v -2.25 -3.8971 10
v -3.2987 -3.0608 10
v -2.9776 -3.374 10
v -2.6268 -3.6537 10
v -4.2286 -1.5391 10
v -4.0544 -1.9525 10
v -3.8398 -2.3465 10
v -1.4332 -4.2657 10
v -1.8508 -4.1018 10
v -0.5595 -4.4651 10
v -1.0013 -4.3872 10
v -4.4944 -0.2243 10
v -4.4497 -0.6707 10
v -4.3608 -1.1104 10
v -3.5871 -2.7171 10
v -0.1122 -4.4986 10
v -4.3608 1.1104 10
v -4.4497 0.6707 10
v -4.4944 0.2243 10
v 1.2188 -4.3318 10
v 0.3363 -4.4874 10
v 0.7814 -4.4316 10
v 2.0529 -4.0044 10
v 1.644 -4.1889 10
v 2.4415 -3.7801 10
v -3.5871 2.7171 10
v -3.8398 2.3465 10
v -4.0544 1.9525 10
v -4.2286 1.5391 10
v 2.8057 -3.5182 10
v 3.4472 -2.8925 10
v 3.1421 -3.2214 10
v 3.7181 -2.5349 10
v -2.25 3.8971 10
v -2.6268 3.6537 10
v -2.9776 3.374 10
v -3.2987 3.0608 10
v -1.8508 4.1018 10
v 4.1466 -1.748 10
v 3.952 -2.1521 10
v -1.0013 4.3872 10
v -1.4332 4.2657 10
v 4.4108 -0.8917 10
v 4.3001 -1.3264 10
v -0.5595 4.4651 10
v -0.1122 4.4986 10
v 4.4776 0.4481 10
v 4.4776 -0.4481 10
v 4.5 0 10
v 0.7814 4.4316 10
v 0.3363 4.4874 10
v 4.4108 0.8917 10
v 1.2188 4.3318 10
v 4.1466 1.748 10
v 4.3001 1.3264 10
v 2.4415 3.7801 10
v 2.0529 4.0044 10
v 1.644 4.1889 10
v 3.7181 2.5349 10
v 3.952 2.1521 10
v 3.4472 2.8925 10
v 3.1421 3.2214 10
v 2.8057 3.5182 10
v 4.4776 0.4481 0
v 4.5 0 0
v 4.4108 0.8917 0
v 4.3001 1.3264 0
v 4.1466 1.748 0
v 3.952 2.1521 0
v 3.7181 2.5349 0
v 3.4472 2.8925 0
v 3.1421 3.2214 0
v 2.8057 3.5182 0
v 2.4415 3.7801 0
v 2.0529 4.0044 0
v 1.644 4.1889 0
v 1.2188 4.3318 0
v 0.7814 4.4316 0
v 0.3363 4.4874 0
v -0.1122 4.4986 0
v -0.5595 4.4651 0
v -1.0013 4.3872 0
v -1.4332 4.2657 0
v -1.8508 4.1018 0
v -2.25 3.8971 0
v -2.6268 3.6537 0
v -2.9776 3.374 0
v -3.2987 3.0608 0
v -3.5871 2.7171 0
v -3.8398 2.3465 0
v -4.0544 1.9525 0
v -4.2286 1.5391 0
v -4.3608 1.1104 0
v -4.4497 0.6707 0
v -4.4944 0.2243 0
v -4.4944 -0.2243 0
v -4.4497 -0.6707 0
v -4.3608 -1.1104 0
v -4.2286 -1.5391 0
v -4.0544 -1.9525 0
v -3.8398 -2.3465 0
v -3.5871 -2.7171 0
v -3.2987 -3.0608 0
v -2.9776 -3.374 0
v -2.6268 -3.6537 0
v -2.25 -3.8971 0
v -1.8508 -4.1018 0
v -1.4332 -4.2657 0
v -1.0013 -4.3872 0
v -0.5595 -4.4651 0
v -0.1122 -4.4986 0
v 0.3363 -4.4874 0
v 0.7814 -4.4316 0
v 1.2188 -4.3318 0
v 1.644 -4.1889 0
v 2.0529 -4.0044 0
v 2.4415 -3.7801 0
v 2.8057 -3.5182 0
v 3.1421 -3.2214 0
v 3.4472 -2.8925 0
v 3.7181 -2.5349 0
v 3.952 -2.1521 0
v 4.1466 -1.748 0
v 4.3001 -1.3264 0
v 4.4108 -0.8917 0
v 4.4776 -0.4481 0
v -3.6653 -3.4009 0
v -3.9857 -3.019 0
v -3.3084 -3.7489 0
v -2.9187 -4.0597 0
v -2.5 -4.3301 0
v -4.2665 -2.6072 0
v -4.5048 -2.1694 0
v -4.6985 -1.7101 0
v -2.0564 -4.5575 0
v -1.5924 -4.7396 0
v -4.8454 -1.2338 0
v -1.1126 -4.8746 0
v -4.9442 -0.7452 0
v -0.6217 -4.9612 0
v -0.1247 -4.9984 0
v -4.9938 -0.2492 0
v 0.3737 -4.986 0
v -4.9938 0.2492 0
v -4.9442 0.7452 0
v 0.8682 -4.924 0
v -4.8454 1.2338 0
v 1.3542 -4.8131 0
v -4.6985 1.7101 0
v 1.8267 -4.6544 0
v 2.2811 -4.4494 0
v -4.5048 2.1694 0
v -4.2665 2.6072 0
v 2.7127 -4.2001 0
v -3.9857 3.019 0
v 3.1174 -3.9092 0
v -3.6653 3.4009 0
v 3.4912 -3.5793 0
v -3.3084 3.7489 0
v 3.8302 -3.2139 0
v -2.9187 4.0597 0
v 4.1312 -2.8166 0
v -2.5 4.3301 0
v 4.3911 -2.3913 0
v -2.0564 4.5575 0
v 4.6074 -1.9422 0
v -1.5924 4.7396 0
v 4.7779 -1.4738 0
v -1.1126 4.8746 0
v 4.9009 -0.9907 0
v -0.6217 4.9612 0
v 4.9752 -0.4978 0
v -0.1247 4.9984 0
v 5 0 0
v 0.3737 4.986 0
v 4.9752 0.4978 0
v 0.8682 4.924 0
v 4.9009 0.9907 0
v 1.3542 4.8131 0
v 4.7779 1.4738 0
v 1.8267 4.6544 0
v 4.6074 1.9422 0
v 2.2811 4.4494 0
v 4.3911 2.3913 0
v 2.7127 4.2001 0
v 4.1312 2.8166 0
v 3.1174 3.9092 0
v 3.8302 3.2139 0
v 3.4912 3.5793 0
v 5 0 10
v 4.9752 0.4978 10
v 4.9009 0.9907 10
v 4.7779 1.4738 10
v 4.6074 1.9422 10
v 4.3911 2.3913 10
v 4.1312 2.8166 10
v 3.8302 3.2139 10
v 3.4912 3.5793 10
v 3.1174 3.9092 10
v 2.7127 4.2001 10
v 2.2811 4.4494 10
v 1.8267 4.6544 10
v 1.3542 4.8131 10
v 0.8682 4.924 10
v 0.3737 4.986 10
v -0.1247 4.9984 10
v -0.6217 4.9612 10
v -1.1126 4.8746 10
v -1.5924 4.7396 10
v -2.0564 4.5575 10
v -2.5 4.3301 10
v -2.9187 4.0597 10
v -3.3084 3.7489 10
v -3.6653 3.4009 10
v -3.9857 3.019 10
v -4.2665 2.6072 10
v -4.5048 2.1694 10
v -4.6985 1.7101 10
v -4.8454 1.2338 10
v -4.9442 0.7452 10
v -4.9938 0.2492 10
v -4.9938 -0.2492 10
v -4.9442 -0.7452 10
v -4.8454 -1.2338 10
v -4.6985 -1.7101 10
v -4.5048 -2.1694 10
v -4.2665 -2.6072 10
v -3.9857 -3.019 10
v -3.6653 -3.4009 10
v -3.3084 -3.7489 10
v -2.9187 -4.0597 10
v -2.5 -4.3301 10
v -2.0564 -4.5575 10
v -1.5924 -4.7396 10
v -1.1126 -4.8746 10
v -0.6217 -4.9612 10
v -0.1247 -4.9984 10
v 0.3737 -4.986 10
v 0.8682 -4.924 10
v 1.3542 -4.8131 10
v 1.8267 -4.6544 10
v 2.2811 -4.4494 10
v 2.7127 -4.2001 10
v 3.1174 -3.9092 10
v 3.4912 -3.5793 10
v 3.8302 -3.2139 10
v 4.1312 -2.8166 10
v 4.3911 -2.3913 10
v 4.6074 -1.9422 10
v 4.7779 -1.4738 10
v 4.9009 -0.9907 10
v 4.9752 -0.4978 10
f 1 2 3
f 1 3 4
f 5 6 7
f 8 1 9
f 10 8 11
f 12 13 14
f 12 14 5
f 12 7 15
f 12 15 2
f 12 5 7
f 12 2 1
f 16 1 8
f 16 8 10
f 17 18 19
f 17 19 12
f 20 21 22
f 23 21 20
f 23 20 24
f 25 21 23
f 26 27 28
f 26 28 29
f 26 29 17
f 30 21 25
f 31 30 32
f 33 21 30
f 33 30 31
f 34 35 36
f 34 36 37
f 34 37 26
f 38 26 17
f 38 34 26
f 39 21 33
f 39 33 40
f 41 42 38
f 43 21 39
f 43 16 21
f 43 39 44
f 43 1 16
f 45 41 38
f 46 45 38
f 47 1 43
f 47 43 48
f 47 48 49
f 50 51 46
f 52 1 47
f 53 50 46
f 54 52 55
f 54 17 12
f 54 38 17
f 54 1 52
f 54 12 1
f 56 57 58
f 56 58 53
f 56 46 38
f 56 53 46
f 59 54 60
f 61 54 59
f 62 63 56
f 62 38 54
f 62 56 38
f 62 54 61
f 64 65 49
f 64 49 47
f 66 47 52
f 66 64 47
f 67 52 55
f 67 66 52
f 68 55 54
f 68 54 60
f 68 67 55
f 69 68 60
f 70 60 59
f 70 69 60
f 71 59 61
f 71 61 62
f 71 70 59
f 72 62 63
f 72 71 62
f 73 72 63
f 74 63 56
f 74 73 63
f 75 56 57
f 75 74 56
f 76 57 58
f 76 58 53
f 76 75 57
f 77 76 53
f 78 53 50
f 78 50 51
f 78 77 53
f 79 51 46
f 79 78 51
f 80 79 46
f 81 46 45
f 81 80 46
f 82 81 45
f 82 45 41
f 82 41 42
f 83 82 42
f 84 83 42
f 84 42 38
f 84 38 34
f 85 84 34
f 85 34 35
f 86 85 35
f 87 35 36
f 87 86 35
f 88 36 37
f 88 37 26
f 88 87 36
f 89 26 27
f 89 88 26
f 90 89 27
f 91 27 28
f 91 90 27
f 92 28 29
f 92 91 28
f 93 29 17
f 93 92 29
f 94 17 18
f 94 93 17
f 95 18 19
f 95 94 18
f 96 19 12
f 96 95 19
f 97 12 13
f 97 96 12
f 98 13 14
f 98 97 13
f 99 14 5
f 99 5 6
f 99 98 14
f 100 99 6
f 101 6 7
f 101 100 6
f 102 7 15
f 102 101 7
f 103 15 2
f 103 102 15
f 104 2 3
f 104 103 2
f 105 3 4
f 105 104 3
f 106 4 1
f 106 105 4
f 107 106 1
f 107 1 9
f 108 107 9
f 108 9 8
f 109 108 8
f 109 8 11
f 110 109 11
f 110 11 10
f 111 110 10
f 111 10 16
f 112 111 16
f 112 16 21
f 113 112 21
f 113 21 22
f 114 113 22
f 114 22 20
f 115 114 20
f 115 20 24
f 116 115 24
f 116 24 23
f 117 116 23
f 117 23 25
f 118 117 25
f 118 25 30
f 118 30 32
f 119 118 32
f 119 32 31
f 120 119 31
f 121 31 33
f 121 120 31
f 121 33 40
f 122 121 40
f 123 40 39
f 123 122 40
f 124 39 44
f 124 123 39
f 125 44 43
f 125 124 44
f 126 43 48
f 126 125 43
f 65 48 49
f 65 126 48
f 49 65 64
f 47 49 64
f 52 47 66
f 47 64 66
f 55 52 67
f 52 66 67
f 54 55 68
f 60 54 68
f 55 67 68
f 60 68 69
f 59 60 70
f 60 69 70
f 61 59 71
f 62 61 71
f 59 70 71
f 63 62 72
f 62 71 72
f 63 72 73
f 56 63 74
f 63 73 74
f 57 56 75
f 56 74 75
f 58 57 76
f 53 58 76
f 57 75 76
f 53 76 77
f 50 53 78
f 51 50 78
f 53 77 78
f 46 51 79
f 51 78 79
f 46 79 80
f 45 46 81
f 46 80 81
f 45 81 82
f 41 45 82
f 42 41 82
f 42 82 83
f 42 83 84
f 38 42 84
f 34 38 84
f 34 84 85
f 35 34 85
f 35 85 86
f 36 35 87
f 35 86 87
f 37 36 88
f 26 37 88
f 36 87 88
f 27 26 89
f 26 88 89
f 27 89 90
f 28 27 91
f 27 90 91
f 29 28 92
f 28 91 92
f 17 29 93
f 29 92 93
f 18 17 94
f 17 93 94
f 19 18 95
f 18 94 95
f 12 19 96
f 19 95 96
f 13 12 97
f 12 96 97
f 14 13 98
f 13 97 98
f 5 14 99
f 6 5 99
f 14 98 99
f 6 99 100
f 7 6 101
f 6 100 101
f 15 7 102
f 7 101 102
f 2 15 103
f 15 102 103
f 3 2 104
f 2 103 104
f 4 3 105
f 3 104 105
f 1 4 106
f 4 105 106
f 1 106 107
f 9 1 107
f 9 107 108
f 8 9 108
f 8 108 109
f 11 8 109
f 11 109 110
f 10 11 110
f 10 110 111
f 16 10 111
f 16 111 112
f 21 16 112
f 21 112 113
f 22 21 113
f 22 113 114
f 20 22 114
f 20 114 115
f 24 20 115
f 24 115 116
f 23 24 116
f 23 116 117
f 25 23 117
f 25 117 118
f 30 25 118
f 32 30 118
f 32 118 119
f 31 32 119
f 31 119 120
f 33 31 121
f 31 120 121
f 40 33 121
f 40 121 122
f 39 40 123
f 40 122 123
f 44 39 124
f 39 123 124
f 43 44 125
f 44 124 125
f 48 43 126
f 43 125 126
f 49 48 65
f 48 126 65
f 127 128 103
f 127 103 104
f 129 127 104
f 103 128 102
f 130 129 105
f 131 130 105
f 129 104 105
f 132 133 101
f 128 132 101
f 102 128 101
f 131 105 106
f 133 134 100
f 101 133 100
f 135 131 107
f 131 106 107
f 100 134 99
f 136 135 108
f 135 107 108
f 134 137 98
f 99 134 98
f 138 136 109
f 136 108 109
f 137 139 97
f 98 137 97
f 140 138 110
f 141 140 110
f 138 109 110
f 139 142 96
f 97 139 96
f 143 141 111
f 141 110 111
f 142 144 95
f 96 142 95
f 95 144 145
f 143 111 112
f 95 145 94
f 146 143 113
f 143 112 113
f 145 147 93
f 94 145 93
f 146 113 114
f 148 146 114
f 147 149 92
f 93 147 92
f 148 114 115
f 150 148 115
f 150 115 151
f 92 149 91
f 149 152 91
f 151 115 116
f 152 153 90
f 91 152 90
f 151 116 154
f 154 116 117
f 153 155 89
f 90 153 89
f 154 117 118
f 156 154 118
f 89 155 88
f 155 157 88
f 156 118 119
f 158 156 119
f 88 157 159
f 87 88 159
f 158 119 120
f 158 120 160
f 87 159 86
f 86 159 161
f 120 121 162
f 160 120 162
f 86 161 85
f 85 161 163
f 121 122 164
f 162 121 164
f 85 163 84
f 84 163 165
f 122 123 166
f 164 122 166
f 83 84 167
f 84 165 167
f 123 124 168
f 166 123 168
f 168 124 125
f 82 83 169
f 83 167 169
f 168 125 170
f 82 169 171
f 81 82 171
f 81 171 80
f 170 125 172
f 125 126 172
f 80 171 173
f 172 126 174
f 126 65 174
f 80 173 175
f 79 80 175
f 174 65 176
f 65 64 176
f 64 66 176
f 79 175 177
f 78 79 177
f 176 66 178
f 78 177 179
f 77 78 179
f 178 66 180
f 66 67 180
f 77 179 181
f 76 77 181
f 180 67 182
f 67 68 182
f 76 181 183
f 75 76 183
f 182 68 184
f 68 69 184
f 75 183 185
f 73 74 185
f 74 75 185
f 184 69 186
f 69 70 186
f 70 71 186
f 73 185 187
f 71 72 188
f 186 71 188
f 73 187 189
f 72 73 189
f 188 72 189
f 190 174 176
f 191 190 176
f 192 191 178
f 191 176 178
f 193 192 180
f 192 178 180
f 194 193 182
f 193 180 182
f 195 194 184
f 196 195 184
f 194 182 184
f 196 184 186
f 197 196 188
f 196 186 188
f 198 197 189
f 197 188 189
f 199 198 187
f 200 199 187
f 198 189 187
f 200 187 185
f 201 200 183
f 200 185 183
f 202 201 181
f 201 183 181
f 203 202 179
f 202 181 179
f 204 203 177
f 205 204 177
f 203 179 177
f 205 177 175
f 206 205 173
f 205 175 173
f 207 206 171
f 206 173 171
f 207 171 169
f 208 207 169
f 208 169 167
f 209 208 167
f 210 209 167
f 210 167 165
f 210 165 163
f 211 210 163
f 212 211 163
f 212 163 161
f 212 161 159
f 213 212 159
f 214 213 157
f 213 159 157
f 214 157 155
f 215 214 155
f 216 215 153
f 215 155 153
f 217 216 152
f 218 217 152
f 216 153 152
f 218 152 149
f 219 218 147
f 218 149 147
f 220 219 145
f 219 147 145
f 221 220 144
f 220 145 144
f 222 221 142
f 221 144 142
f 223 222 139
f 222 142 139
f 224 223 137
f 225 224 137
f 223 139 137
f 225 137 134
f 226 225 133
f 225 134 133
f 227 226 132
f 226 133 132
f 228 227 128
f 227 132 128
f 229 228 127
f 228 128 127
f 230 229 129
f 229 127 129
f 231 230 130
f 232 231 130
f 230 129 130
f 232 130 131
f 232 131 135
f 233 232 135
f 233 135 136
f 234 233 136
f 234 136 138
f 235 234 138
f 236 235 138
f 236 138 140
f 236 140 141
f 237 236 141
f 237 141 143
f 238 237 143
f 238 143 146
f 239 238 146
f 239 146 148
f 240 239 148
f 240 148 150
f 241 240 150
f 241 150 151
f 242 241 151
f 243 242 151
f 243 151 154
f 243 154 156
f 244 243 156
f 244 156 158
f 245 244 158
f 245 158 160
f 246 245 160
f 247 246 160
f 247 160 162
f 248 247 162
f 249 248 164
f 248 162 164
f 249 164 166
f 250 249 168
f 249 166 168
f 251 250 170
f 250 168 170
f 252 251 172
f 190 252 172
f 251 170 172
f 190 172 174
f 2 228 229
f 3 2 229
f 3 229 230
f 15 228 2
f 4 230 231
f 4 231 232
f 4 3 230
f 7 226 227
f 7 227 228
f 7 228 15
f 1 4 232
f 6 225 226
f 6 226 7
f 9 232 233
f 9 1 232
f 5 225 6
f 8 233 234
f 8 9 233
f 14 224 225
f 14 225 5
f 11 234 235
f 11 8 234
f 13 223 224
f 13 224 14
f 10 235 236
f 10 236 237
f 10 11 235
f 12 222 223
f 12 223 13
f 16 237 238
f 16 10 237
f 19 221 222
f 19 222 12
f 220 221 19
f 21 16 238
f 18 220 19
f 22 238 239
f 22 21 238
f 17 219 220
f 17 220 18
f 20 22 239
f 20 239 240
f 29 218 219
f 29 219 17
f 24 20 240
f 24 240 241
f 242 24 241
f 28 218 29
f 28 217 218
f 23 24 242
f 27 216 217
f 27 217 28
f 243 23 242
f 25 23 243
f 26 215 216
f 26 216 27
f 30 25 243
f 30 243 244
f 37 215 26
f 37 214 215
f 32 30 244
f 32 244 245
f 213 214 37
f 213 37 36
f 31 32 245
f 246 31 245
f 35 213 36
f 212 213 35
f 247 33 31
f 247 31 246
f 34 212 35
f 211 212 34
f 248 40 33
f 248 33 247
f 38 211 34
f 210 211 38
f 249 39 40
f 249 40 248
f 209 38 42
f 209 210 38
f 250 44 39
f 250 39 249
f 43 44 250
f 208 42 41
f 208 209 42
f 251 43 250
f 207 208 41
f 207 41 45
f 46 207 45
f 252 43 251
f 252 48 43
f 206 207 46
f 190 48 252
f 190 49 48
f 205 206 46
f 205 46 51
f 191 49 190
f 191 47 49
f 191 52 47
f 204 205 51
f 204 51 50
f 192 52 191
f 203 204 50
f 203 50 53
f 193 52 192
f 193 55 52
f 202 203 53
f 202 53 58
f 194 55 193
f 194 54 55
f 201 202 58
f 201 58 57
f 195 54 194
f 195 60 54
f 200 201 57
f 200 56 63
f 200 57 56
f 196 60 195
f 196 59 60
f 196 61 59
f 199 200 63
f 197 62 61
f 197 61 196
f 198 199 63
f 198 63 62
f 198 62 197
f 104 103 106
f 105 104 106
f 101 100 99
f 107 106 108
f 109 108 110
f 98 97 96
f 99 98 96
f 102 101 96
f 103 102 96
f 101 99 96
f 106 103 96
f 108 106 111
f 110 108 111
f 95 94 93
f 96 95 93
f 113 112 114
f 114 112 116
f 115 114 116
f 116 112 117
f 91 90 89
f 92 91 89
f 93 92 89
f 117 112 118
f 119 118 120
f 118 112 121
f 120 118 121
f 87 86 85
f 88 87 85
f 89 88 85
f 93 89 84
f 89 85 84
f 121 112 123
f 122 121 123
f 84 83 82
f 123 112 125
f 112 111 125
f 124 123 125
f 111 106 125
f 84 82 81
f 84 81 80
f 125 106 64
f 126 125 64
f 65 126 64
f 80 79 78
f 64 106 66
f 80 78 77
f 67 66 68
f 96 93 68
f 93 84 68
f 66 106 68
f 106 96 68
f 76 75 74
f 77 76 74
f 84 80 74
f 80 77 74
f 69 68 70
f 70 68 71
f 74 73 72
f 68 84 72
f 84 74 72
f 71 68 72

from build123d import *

# Parameters (mm, degrees)
CYLINDER001_R     = 4.5
CYLINDER001_DEPTH = 10
CYLINDER_R        = 5
CYLINDER_DEPTH    = 10
CYLINDER002_R     = 4.5
CYLINDER002_DEPTH = 10


with BuildPart() as cylinder001:
    # Cylinder001 → Cylinder001 (new body)
    with BuildSketch(Plane.XY):
        Circle(CYLINDER001_R)
    extrude(amount=CYLINDER001_DEPTH)


with BuildPart() as cut:
    # Cylinder → Cylinder (new body)
    with BuildSketch(Plane.XY):
        Circle(CYLINDER_R)
    extrude(amount=CYLINDER_DEPTH)

    # Cut: cut Cylinder001
    add(cylinder001.part, mode=Mode.SUBTRACT)


with BuildPart() as cylinder002:
    # Cylinder002 → Cylinder002 (new body)
    with BuildSketch(Plane.XY):
        Circle(CYLINDER002_R)
    extrude(amount=CYLINDER002_DEPTH)


solid = Compound([cut.part, cylinder002.part])
